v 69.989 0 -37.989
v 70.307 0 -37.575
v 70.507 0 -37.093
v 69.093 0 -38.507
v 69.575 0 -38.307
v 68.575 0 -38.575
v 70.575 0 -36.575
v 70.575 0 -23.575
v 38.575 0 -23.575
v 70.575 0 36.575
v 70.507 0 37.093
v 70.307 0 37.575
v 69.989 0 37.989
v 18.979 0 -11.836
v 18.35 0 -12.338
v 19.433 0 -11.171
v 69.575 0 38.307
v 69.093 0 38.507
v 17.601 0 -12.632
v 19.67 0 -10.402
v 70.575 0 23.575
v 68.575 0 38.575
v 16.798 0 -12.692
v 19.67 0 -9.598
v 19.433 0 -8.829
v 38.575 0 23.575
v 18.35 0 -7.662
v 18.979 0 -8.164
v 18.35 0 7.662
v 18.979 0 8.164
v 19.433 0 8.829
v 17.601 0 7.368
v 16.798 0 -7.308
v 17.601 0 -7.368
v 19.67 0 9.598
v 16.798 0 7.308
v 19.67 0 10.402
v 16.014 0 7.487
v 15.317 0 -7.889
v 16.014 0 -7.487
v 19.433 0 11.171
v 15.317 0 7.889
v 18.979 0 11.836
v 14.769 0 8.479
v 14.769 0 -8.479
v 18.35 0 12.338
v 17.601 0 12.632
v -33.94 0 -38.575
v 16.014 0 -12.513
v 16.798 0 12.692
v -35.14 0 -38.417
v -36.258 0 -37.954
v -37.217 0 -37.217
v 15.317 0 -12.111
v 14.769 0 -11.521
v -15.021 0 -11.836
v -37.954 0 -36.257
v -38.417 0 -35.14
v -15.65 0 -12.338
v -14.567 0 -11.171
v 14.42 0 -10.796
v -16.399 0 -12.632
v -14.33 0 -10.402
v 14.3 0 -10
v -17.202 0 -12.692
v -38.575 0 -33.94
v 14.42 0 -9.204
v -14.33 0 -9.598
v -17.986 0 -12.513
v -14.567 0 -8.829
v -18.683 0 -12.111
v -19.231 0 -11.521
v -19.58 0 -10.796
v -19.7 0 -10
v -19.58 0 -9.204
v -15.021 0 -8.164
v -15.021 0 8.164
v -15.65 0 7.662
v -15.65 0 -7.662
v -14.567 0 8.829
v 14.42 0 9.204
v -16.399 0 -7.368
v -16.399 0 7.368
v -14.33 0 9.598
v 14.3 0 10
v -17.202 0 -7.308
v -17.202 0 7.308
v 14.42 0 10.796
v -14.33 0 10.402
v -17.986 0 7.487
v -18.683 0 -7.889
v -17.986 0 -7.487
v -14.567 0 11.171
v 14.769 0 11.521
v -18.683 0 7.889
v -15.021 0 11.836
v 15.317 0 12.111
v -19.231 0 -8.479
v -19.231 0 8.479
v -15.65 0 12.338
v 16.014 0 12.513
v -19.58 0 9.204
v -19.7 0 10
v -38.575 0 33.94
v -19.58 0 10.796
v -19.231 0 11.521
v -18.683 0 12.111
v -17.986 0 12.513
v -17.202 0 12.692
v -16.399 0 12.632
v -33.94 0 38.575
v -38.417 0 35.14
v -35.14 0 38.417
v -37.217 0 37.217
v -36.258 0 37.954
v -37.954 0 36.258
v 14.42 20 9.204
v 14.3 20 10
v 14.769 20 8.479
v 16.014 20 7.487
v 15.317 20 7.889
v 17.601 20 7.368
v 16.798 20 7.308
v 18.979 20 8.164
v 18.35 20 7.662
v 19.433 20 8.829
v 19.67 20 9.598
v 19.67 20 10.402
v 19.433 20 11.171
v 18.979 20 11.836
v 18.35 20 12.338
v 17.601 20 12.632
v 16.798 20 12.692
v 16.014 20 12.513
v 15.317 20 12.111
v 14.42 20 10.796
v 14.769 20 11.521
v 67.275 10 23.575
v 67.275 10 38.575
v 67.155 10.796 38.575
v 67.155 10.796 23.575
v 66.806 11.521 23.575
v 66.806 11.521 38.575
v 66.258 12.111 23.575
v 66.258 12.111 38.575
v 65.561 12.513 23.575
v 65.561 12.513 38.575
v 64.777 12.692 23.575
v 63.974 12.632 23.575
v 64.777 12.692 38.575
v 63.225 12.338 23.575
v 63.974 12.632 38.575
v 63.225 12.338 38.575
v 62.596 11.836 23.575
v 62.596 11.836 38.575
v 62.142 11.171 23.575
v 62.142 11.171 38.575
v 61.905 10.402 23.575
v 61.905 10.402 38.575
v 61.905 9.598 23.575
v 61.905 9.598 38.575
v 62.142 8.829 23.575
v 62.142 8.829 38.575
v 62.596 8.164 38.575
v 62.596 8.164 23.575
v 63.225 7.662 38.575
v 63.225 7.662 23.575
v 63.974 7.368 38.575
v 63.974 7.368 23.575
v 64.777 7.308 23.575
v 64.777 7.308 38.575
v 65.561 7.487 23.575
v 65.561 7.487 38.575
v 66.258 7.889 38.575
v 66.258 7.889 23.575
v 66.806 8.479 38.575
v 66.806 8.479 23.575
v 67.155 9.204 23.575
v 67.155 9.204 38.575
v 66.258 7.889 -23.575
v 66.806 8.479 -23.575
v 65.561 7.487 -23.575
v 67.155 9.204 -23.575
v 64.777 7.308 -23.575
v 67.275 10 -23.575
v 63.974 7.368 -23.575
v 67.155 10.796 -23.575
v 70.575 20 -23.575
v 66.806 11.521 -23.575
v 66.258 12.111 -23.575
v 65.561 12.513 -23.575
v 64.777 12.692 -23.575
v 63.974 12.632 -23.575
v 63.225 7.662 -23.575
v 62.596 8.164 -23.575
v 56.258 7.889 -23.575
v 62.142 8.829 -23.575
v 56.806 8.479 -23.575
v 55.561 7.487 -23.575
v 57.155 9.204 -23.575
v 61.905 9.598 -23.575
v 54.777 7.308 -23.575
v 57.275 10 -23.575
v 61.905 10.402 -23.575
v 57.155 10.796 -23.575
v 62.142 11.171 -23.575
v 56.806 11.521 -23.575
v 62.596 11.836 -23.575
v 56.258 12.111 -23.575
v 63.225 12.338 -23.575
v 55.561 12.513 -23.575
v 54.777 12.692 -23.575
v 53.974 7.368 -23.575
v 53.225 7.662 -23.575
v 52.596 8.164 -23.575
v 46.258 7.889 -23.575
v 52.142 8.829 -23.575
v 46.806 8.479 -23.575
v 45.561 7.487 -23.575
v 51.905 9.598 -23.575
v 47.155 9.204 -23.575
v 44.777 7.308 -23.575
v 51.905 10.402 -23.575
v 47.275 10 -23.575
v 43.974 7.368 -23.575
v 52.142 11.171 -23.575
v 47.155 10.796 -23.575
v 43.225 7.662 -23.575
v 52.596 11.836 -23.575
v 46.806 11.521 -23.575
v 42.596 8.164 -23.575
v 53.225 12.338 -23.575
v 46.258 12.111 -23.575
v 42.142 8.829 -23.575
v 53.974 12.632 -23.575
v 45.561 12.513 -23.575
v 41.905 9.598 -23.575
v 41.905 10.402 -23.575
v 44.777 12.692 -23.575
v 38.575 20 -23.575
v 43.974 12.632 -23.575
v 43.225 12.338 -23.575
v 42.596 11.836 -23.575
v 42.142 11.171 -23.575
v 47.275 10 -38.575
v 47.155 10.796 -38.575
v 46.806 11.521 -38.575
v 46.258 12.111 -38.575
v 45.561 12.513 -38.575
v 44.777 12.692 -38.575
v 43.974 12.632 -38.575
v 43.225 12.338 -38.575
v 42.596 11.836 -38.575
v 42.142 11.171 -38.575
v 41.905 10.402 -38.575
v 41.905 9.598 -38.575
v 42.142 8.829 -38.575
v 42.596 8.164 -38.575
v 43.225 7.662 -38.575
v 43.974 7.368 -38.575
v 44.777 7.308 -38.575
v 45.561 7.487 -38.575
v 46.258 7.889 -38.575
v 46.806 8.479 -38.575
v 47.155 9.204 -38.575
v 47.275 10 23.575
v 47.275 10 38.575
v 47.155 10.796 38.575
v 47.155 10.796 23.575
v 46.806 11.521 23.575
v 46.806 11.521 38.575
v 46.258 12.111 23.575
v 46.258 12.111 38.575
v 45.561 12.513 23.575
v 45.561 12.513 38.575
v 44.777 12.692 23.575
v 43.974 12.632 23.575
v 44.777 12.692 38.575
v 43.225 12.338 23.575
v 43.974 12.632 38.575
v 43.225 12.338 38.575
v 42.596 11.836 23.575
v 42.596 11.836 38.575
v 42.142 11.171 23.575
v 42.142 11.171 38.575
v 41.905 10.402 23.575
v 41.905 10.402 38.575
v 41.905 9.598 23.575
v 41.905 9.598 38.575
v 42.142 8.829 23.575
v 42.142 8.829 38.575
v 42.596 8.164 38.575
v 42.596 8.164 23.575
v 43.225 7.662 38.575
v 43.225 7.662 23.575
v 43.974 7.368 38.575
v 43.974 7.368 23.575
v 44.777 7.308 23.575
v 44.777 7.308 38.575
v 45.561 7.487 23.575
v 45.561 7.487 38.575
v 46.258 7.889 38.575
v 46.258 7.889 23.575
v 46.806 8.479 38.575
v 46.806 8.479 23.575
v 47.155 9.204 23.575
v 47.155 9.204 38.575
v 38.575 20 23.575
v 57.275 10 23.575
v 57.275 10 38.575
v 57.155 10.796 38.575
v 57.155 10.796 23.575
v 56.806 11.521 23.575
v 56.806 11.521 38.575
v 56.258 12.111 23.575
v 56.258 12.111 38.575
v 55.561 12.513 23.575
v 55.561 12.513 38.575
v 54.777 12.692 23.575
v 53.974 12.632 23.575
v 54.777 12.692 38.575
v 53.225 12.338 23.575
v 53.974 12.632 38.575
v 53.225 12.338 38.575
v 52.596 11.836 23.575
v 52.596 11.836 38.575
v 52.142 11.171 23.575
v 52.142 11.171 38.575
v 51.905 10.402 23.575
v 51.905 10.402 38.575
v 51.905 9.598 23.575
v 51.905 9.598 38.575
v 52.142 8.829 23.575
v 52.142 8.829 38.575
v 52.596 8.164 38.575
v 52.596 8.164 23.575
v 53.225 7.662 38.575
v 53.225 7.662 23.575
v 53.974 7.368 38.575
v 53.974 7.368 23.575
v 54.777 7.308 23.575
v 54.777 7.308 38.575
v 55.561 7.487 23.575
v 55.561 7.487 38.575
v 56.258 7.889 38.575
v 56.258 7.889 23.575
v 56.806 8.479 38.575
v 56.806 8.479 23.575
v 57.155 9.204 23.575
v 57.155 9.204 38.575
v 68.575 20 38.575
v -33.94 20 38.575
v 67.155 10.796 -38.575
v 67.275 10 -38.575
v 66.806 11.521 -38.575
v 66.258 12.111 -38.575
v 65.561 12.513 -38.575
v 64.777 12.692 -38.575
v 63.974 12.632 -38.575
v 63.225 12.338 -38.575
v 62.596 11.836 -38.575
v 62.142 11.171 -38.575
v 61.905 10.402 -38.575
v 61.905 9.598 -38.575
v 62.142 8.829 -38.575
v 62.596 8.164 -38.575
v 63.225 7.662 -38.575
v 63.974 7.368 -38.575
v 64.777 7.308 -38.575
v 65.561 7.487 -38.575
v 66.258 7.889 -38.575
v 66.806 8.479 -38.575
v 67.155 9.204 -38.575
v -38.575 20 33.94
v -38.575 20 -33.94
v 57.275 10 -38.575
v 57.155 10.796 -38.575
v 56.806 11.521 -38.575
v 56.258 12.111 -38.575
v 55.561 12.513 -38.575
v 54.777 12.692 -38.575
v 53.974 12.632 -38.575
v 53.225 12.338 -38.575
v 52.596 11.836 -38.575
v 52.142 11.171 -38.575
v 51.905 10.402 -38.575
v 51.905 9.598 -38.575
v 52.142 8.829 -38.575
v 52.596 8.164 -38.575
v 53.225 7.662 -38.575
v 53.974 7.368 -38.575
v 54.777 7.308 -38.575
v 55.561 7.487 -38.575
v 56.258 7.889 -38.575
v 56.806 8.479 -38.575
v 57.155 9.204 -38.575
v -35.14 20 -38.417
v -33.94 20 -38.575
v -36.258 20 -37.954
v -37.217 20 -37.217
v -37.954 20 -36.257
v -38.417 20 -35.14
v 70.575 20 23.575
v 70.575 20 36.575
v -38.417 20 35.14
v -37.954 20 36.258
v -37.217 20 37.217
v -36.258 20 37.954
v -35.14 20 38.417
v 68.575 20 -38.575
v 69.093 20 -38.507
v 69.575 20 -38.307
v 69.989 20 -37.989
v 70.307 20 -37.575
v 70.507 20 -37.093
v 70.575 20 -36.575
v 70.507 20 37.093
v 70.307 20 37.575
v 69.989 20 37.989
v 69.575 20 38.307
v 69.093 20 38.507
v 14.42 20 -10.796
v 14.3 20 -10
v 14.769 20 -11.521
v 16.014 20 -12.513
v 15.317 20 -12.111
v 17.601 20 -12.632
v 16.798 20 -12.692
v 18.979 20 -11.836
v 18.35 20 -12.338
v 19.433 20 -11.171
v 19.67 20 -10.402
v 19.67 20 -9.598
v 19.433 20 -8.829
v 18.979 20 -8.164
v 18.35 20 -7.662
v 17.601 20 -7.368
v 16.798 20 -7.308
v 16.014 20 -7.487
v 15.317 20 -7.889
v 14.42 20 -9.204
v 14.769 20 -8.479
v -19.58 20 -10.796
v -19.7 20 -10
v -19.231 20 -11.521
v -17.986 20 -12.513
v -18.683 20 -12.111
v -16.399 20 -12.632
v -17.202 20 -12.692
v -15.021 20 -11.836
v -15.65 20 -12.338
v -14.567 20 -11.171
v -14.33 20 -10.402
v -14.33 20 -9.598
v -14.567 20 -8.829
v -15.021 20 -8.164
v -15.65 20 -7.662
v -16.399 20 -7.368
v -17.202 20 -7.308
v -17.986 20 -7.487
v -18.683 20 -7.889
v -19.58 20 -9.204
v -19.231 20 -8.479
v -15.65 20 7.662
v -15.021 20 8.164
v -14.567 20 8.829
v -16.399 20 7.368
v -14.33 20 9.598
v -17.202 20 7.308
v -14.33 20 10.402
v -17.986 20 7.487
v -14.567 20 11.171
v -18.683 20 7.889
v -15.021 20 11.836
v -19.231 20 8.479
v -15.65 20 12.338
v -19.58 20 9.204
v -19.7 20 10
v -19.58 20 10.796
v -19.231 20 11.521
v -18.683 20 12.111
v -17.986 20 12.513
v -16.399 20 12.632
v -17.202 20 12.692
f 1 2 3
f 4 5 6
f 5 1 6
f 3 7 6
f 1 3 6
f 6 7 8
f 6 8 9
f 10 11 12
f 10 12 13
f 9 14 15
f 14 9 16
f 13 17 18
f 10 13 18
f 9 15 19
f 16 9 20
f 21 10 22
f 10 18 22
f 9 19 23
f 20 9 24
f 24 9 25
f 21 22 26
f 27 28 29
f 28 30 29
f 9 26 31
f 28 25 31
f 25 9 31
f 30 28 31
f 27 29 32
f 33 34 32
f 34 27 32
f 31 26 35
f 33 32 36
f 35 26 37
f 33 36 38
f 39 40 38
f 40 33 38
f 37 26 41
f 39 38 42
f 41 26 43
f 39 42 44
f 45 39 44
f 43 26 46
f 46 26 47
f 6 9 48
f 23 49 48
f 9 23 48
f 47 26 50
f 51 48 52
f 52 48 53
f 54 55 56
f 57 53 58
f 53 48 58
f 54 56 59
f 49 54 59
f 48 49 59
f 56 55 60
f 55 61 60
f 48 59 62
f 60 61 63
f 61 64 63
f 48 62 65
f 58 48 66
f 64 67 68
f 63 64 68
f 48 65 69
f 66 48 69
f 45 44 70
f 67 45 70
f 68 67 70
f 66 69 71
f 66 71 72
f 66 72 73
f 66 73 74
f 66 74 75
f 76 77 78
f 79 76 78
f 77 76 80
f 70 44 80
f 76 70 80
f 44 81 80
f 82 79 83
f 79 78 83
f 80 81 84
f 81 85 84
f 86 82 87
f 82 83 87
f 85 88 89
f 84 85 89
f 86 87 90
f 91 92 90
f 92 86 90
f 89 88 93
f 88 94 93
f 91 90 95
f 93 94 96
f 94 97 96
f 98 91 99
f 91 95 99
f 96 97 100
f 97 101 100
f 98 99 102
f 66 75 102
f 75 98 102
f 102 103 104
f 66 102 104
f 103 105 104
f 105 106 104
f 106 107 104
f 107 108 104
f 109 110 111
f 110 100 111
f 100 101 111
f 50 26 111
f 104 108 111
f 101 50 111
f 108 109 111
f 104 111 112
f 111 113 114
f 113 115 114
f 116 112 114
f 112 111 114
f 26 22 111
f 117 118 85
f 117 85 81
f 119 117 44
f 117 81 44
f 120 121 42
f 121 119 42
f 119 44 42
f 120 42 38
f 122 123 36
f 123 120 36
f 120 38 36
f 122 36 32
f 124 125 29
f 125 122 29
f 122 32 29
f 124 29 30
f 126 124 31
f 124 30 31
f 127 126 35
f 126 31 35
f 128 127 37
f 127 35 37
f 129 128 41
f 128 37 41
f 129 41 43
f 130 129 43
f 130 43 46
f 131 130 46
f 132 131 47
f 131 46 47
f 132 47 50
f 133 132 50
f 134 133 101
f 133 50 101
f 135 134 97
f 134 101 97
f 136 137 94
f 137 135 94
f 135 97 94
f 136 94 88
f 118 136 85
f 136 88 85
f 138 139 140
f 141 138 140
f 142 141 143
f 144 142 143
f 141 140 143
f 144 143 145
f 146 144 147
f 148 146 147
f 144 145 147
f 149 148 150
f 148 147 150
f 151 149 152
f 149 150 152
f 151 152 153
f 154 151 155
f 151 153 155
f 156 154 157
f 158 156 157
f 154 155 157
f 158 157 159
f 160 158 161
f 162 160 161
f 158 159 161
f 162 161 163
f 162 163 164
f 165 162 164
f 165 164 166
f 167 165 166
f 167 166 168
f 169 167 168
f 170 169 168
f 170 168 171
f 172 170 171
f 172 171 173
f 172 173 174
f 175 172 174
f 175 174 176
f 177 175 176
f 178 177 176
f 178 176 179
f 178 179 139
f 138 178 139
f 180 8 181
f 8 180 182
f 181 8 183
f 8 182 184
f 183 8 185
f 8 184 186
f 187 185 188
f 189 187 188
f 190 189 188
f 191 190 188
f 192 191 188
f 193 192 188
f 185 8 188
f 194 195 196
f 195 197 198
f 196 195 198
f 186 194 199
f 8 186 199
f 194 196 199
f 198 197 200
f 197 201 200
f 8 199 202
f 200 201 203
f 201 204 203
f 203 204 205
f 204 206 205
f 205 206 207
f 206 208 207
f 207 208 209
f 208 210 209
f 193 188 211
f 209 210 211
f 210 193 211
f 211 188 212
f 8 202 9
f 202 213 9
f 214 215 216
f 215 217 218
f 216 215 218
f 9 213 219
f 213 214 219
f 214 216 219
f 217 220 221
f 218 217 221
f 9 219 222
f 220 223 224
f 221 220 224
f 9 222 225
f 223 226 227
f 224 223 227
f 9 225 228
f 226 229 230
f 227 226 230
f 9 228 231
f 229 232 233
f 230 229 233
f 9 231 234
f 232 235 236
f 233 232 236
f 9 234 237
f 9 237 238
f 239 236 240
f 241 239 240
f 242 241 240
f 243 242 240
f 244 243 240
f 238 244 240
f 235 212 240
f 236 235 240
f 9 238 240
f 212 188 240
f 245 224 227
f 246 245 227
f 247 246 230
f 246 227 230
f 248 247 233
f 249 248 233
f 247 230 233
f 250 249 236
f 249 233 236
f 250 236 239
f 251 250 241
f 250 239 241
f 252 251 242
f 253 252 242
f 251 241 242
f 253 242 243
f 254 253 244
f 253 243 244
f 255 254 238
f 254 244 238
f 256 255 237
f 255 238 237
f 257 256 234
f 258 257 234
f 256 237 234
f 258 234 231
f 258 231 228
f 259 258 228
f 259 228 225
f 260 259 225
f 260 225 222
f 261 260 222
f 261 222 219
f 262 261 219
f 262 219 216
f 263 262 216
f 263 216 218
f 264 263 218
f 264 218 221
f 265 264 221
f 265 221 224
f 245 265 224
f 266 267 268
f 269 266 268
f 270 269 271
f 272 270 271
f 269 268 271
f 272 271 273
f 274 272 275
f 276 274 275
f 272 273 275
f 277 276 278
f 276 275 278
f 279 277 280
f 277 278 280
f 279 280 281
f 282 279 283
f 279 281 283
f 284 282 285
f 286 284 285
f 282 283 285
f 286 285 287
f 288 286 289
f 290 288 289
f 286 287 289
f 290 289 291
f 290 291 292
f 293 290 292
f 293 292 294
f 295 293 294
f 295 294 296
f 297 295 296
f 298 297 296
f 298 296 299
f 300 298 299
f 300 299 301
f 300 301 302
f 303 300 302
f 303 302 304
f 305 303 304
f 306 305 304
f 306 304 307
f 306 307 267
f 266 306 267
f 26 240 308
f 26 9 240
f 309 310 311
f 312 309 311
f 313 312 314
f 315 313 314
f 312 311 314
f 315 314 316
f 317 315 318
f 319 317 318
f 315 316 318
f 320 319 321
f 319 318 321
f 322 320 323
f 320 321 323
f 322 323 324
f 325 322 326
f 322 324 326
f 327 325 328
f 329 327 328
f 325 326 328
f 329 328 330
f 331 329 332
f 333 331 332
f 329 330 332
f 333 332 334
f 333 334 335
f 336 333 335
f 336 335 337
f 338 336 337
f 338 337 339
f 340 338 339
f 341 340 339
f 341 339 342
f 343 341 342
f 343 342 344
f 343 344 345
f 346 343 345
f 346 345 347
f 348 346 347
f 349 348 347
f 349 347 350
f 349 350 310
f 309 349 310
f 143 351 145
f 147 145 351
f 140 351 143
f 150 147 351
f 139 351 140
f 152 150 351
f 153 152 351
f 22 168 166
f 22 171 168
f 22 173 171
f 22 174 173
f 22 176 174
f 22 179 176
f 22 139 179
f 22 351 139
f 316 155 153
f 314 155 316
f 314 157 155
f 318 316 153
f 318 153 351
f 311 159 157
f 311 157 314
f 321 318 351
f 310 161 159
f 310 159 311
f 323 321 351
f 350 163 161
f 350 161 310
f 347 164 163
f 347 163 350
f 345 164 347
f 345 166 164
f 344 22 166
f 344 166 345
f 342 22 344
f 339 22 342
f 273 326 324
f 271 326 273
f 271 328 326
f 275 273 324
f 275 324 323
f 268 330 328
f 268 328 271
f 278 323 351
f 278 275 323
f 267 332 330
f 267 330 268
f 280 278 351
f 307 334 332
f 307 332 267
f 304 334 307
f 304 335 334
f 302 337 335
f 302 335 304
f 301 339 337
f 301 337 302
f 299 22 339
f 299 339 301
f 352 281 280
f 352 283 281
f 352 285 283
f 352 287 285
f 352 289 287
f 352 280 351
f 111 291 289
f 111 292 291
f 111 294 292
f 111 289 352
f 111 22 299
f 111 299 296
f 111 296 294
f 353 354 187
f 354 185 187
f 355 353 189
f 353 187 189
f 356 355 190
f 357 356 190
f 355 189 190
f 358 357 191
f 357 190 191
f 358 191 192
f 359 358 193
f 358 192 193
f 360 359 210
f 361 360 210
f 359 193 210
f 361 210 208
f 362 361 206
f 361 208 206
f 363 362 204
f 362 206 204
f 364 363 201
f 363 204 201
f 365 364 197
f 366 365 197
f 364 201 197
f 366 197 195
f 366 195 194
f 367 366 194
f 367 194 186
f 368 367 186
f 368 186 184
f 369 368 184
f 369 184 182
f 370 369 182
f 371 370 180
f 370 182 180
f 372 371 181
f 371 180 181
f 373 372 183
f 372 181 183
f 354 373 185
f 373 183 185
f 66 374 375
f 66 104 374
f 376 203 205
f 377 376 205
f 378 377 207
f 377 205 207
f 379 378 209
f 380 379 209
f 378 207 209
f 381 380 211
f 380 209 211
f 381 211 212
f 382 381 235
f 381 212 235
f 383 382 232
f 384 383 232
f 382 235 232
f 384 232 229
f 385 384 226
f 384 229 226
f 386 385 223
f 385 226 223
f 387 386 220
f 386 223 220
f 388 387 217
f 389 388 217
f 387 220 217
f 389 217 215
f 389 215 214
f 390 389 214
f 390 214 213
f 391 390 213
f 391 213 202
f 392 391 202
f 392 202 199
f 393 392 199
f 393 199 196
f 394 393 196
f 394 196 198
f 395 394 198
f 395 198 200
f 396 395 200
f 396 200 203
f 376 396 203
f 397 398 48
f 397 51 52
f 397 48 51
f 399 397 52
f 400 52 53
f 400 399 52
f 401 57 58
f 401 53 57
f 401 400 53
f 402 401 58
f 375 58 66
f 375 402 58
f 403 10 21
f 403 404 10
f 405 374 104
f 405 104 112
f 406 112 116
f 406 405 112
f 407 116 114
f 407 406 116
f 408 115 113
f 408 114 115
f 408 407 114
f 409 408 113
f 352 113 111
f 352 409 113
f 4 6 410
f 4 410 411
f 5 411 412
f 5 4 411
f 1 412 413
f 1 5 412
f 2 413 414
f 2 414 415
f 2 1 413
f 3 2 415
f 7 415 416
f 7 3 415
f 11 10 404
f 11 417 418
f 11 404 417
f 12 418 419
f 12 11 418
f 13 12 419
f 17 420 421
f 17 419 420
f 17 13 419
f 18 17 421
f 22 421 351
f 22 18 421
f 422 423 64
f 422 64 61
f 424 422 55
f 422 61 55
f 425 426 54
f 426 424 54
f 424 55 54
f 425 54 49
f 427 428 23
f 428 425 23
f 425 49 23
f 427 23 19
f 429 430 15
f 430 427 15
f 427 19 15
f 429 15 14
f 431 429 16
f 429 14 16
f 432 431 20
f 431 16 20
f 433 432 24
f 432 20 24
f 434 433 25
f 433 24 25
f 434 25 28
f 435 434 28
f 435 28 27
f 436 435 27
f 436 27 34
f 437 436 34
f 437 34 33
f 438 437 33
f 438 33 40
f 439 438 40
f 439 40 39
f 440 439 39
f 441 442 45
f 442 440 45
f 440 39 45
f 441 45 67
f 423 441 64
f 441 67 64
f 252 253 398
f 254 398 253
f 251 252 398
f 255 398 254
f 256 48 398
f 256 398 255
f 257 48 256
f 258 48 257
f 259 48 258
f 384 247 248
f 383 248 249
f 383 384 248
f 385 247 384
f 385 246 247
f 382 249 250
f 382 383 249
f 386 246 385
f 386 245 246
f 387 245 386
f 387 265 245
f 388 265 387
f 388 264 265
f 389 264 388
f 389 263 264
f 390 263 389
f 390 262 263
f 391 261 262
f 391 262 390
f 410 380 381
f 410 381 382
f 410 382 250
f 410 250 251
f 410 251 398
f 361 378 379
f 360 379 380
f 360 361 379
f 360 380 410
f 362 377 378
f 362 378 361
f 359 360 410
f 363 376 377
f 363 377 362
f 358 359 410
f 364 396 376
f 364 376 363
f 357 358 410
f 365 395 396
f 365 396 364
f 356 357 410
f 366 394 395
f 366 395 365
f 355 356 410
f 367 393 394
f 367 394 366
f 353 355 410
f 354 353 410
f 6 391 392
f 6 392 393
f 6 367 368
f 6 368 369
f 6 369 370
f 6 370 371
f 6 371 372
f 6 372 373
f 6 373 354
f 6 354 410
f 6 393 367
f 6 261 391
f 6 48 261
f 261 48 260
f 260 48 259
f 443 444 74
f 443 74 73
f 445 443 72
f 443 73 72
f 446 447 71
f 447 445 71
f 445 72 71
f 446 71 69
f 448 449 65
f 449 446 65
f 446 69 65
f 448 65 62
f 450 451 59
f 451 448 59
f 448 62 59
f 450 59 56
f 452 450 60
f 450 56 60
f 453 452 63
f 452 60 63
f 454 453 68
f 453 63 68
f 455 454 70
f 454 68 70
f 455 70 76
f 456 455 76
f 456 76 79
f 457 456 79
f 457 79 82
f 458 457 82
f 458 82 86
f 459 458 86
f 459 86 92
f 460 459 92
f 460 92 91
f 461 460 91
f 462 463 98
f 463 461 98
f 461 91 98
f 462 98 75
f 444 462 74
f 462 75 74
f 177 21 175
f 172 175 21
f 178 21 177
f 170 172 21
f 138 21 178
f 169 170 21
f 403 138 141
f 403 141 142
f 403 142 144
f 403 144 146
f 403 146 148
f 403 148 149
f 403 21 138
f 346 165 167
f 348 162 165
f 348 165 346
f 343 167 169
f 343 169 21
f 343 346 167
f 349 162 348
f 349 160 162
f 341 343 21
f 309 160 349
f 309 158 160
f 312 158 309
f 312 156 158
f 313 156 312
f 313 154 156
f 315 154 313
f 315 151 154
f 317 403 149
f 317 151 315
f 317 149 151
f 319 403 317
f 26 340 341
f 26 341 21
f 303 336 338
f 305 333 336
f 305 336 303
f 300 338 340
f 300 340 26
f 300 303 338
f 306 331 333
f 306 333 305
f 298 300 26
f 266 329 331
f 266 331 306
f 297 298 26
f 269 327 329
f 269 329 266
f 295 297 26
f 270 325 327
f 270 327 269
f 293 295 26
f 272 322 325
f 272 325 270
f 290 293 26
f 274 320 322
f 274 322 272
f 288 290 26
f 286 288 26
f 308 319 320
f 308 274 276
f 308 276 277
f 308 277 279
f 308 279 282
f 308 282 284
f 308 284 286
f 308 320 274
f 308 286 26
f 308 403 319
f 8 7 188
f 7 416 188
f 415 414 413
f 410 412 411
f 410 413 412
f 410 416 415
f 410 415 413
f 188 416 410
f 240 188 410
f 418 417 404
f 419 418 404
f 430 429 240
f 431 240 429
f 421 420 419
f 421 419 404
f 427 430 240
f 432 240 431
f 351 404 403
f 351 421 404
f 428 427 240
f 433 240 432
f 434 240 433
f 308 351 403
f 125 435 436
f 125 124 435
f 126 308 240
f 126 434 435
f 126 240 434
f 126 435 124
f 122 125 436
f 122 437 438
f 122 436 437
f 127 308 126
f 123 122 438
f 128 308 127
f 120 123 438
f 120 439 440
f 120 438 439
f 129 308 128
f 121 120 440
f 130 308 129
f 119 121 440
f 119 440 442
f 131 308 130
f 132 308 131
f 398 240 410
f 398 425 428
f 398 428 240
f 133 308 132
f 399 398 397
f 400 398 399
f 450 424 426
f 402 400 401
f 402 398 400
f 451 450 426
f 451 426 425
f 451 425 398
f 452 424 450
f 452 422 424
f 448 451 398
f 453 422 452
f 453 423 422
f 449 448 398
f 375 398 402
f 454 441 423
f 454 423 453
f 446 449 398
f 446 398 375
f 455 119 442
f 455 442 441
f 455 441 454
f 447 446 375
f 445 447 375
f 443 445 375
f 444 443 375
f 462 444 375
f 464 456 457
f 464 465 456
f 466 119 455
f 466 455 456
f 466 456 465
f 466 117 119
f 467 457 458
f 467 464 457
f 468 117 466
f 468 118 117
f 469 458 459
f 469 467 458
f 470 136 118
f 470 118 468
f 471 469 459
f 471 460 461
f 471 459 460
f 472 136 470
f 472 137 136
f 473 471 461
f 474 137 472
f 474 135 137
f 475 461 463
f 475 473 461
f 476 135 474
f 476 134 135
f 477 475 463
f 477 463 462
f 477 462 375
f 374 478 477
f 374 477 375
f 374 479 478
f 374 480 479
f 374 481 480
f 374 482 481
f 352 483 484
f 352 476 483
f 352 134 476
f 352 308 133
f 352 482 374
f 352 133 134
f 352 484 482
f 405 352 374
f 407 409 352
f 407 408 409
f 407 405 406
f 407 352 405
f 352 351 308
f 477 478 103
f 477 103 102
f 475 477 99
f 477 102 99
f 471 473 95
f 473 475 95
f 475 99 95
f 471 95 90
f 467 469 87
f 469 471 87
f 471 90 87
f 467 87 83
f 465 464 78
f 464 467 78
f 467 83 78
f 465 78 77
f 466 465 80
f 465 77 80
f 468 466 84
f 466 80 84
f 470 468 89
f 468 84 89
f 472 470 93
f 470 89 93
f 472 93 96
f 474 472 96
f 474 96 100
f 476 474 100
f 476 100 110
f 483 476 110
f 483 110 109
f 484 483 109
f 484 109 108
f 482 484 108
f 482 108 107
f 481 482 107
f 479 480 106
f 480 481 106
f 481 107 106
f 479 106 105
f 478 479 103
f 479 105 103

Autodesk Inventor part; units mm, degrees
ref_plane "YZ Plane" through (0, 0, 0) normal (1, 0, 0) x (0, 1, 0)
ref_plane "XZ Plane" through (0, 0, 0) normal (0, 1, 0) x (-1, 0, 0)
ref_plane "XY Plane" through (0, 0, 0) normal (0, 0, 1) x (1, 0, 0)
sketch "Boceto1" plane through (0, 0, 0) normal (0, 1, 0) x (-1, 0, 0)
  line L0 (-38.575, 38.575) -> (38.575, 38.575)
  line L1 (38.575, 38.575) -> (38.575, -38.575)
  line L2 (38.575, -38.575) -> (-38.575, -38.575)
  line L3 (-38.575, -38.575) -> (-38.575, 38.575)
  line L4 (-38.575, 38.575) -> (38.575, -38.575) construction
  line L5 (38.575, 38.575) -> (-38.575, -38.575) construction
  circle A0 centre (17, 10) radius 2.7
  circle A1 centre (17, -10) radius 2.7
  circle A2 centre (-17, -10) radius 2.7
  circle A3 centre (-17, 10) radius 2.7
  point P0 (0, 0)
  dimension "d0" = 77.15
  dimension "d1" = 77.15
  dimension "d2" = 5.4
  dimension "d3" = 10
  dimension "d4" = 10
  dimension "d5" = 17
  dimension "d6" = 17
extrude "Extrusión1" add sketch "Boceto1" along normal blind 20
sketch "Boceto2" plane through (0, 20, 0) normal (0, 1, 0) x (1, 0, 0)
  line L0 (-38.575, -38.575) -> (38.575, -38.575) projected
  line L1 (38.575, -38.575) -> (70.575, -38.575)
  line L2 (70.575, -38.575) -> (70.575, -23.575)
  line L3 (70.575, -23.575) -> (38.575, -23.575)
  line L4 (38.575, -23.575) -> (38.575, -38.575)
  line L5 (38.575, 38.575) -> (-38.575, 38.575) projected
  line L6 (38.575, 38.575) -> (70.575, 38.575)
  line L7 (70.575, 38.575) -> (70.575, 23.575)
  line L8 (70.575, 23.575) -> (38.575, 23.575)
  line L9 (38.575, 23.575) -> (38.575, 38.575)
  point P0 (0, 0)
  dimension "d9" = 32
  dimension "d10" = 15
extrude "Extrusión2" add sketch "Boceto2" against normal up to surface (20 mm away)
sketch "Boceto3" plane through (-38.575, 0, 38.575) normal (0, 0, 1) x (1, 0, 0)
  circle A0 centre (103.15, 10) radius 2.7
  circle A1 centre (93.15, 10) radius 2.7
  line L0 (109.15, 20) -> (109.15, 0) projected
  circle A2 centre (83.15, 10) radius 2.7
  point P0 (38.575, 0)
  dimension "d13" = 5.4
  dimension "d14" = 6
  dimension "d15" = 10
  dimension "d34" = 10
extrude "Extrusión3" cut sketch "Boceto3" against normal through all
fillet "Empalme2" radius 4.635 2 edges at (-38.575, 10, 38.575) (-38.575, 10, -38.575)
fillet "Empalme3" radius 2 2 edges at (70.575, 10, -38.575) (70.575, 10, 38.575)
sketch "Boceto4" plane through (0, 20, 0) normal (0, 1, 0) x (1, 0, 0)
  line L0 (53.225, -32.695) -> (61.325, -32.695)
  line L1 (61.325, -32.695) -> (61.325, -28.455)
  line L2 (61.325, -28.455) -> (53.225, -28.455)
  line L3 (53.225, -28.455) -> (53.225, -32.695)
  line L4 (53.225, -32.695) -> (61.325, -28.455) construction
  line L5 (61.325, -32.695) -> (53.225, -28.455) construction
  line L6 (57.275, -38.575) -> (51.875, -38.575) projected
  point P0 (0, 0)
  point P1 (57.275, -30.575)
  dimension "d21" = 8.1
  dimension "d23" = 1.35
  dimension "d24" = 8
  dimension "d25" = 4.24
properties part number "UpperJaw" material "Plástico ABS"
